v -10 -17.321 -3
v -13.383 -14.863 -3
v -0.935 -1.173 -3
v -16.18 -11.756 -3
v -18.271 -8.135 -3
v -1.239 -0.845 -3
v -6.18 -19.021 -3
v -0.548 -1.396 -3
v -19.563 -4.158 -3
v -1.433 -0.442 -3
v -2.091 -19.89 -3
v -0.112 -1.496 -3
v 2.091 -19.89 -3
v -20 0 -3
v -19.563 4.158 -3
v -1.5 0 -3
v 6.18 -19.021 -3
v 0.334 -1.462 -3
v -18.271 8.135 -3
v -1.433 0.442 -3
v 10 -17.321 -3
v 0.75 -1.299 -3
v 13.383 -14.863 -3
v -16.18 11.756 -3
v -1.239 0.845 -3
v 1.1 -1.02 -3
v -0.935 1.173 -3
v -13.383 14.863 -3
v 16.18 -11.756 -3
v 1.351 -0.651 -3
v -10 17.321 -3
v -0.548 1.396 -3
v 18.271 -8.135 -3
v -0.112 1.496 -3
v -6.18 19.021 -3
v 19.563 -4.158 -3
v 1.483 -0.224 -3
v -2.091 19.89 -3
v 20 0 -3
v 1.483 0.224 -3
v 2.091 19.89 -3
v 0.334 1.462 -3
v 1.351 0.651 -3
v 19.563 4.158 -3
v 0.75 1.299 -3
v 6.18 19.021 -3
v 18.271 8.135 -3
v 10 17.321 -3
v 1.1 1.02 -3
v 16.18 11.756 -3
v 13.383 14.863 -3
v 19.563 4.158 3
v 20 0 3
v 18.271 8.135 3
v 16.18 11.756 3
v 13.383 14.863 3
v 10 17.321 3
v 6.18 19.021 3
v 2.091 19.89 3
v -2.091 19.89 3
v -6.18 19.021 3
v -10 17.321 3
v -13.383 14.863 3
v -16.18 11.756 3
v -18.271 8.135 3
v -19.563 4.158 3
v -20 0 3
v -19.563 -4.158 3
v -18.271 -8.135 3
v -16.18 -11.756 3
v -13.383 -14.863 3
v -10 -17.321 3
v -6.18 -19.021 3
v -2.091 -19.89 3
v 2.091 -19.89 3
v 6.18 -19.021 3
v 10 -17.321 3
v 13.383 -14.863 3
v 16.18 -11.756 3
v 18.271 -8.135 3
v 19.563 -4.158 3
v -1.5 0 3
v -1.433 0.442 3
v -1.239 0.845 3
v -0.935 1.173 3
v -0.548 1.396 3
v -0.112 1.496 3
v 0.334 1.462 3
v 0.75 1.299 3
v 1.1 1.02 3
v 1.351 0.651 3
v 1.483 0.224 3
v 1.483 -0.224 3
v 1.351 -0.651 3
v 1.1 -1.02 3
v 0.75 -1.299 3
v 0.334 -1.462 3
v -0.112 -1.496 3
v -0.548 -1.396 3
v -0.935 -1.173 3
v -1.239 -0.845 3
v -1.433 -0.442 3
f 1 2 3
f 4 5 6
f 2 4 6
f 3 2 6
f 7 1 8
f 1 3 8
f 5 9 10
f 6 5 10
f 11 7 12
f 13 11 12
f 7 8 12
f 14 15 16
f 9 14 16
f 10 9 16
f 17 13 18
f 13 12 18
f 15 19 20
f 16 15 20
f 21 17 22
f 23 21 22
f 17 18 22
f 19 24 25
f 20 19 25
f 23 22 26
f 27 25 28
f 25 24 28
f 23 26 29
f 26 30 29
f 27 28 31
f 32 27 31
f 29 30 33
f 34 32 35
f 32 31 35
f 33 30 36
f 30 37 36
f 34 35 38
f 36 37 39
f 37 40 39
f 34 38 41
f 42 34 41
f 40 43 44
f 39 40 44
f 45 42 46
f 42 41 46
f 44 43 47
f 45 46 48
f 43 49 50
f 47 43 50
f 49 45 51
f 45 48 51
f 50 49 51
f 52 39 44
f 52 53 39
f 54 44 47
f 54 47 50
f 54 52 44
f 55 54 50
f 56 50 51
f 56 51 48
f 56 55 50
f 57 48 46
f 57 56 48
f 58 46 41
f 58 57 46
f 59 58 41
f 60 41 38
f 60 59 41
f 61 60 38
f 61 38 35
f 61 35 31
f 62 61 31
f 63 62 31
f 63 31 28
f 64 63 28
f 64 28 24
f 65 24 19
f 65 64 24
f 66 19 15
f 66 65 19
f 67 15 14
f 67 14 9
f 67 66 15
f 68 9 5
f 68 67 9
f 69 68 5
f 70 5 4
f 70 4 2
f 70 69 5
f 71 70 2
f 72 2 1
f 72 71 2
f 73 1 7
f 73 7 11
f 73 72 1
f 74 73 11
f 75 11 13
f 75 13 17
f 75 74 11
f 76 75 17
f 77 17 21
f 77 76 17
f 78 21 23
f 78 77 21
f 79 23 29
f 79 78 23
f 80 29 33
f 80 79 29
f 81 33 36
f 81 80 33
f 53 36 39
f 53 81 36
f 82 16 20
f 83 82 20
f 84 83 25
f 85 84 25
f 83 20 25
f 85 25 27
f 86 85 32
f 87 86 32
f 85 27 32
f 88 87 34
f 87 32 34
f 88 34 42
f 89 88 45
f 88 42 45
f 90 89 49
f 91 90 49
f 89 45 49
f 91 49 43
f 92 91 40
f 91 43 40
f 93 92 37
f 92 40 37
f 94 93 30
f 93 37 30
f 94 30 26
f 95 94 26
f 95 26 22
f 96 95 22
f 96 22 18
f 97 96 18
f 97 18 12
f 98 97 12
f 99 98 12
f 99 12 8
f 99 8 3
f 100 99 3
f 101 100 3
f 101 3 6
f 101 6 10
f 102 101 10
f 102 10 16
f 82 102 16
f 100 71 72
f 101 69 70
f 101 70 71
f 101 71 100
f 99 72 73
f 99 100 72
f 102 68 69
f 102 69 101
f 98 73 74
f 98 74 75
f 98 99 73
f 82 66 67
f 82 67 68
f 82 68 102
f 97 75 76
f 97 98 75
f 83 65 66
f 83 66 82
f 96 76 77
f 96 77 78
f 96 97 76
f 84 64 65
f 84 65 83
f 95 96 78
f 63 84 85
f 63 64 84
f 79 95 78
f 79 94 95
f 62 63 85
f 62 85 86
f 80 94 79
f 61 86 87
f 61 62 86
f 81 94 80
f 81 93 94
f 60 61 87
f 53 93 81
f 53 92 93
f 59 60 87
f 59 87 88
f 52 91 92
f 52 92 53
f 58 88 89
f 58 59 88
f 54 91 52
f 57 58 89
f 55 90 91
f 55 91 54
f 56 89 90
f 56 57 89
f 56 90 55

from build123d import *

# Parameters (mm, degrees)
F0_R     = 20
F1_DEPTH = 3
F2_D     = 3
F3_D     = 3


with BuildPart() as f1:
    # F0 (on Top) → F1 (new body, symmetric)
    with BuildSketch(Plane.XY):
        Circle(F0_R)
    extrude(amount=F1_DEPTH, both=True)

    # F2 (through all)
    with Locations(Plane.XY):
        with Locations((0, 0)):
            Hole(F2_D / 2)

    # F3 (through all)
    with Locations(Plane(origin=(0, 0, 0), x_dir=(1, 0, 0), z_dir=(0, 0, -1))):
        with Locations((0, 0)):
            Hole(F3_D / 2)


solid = f1.part
